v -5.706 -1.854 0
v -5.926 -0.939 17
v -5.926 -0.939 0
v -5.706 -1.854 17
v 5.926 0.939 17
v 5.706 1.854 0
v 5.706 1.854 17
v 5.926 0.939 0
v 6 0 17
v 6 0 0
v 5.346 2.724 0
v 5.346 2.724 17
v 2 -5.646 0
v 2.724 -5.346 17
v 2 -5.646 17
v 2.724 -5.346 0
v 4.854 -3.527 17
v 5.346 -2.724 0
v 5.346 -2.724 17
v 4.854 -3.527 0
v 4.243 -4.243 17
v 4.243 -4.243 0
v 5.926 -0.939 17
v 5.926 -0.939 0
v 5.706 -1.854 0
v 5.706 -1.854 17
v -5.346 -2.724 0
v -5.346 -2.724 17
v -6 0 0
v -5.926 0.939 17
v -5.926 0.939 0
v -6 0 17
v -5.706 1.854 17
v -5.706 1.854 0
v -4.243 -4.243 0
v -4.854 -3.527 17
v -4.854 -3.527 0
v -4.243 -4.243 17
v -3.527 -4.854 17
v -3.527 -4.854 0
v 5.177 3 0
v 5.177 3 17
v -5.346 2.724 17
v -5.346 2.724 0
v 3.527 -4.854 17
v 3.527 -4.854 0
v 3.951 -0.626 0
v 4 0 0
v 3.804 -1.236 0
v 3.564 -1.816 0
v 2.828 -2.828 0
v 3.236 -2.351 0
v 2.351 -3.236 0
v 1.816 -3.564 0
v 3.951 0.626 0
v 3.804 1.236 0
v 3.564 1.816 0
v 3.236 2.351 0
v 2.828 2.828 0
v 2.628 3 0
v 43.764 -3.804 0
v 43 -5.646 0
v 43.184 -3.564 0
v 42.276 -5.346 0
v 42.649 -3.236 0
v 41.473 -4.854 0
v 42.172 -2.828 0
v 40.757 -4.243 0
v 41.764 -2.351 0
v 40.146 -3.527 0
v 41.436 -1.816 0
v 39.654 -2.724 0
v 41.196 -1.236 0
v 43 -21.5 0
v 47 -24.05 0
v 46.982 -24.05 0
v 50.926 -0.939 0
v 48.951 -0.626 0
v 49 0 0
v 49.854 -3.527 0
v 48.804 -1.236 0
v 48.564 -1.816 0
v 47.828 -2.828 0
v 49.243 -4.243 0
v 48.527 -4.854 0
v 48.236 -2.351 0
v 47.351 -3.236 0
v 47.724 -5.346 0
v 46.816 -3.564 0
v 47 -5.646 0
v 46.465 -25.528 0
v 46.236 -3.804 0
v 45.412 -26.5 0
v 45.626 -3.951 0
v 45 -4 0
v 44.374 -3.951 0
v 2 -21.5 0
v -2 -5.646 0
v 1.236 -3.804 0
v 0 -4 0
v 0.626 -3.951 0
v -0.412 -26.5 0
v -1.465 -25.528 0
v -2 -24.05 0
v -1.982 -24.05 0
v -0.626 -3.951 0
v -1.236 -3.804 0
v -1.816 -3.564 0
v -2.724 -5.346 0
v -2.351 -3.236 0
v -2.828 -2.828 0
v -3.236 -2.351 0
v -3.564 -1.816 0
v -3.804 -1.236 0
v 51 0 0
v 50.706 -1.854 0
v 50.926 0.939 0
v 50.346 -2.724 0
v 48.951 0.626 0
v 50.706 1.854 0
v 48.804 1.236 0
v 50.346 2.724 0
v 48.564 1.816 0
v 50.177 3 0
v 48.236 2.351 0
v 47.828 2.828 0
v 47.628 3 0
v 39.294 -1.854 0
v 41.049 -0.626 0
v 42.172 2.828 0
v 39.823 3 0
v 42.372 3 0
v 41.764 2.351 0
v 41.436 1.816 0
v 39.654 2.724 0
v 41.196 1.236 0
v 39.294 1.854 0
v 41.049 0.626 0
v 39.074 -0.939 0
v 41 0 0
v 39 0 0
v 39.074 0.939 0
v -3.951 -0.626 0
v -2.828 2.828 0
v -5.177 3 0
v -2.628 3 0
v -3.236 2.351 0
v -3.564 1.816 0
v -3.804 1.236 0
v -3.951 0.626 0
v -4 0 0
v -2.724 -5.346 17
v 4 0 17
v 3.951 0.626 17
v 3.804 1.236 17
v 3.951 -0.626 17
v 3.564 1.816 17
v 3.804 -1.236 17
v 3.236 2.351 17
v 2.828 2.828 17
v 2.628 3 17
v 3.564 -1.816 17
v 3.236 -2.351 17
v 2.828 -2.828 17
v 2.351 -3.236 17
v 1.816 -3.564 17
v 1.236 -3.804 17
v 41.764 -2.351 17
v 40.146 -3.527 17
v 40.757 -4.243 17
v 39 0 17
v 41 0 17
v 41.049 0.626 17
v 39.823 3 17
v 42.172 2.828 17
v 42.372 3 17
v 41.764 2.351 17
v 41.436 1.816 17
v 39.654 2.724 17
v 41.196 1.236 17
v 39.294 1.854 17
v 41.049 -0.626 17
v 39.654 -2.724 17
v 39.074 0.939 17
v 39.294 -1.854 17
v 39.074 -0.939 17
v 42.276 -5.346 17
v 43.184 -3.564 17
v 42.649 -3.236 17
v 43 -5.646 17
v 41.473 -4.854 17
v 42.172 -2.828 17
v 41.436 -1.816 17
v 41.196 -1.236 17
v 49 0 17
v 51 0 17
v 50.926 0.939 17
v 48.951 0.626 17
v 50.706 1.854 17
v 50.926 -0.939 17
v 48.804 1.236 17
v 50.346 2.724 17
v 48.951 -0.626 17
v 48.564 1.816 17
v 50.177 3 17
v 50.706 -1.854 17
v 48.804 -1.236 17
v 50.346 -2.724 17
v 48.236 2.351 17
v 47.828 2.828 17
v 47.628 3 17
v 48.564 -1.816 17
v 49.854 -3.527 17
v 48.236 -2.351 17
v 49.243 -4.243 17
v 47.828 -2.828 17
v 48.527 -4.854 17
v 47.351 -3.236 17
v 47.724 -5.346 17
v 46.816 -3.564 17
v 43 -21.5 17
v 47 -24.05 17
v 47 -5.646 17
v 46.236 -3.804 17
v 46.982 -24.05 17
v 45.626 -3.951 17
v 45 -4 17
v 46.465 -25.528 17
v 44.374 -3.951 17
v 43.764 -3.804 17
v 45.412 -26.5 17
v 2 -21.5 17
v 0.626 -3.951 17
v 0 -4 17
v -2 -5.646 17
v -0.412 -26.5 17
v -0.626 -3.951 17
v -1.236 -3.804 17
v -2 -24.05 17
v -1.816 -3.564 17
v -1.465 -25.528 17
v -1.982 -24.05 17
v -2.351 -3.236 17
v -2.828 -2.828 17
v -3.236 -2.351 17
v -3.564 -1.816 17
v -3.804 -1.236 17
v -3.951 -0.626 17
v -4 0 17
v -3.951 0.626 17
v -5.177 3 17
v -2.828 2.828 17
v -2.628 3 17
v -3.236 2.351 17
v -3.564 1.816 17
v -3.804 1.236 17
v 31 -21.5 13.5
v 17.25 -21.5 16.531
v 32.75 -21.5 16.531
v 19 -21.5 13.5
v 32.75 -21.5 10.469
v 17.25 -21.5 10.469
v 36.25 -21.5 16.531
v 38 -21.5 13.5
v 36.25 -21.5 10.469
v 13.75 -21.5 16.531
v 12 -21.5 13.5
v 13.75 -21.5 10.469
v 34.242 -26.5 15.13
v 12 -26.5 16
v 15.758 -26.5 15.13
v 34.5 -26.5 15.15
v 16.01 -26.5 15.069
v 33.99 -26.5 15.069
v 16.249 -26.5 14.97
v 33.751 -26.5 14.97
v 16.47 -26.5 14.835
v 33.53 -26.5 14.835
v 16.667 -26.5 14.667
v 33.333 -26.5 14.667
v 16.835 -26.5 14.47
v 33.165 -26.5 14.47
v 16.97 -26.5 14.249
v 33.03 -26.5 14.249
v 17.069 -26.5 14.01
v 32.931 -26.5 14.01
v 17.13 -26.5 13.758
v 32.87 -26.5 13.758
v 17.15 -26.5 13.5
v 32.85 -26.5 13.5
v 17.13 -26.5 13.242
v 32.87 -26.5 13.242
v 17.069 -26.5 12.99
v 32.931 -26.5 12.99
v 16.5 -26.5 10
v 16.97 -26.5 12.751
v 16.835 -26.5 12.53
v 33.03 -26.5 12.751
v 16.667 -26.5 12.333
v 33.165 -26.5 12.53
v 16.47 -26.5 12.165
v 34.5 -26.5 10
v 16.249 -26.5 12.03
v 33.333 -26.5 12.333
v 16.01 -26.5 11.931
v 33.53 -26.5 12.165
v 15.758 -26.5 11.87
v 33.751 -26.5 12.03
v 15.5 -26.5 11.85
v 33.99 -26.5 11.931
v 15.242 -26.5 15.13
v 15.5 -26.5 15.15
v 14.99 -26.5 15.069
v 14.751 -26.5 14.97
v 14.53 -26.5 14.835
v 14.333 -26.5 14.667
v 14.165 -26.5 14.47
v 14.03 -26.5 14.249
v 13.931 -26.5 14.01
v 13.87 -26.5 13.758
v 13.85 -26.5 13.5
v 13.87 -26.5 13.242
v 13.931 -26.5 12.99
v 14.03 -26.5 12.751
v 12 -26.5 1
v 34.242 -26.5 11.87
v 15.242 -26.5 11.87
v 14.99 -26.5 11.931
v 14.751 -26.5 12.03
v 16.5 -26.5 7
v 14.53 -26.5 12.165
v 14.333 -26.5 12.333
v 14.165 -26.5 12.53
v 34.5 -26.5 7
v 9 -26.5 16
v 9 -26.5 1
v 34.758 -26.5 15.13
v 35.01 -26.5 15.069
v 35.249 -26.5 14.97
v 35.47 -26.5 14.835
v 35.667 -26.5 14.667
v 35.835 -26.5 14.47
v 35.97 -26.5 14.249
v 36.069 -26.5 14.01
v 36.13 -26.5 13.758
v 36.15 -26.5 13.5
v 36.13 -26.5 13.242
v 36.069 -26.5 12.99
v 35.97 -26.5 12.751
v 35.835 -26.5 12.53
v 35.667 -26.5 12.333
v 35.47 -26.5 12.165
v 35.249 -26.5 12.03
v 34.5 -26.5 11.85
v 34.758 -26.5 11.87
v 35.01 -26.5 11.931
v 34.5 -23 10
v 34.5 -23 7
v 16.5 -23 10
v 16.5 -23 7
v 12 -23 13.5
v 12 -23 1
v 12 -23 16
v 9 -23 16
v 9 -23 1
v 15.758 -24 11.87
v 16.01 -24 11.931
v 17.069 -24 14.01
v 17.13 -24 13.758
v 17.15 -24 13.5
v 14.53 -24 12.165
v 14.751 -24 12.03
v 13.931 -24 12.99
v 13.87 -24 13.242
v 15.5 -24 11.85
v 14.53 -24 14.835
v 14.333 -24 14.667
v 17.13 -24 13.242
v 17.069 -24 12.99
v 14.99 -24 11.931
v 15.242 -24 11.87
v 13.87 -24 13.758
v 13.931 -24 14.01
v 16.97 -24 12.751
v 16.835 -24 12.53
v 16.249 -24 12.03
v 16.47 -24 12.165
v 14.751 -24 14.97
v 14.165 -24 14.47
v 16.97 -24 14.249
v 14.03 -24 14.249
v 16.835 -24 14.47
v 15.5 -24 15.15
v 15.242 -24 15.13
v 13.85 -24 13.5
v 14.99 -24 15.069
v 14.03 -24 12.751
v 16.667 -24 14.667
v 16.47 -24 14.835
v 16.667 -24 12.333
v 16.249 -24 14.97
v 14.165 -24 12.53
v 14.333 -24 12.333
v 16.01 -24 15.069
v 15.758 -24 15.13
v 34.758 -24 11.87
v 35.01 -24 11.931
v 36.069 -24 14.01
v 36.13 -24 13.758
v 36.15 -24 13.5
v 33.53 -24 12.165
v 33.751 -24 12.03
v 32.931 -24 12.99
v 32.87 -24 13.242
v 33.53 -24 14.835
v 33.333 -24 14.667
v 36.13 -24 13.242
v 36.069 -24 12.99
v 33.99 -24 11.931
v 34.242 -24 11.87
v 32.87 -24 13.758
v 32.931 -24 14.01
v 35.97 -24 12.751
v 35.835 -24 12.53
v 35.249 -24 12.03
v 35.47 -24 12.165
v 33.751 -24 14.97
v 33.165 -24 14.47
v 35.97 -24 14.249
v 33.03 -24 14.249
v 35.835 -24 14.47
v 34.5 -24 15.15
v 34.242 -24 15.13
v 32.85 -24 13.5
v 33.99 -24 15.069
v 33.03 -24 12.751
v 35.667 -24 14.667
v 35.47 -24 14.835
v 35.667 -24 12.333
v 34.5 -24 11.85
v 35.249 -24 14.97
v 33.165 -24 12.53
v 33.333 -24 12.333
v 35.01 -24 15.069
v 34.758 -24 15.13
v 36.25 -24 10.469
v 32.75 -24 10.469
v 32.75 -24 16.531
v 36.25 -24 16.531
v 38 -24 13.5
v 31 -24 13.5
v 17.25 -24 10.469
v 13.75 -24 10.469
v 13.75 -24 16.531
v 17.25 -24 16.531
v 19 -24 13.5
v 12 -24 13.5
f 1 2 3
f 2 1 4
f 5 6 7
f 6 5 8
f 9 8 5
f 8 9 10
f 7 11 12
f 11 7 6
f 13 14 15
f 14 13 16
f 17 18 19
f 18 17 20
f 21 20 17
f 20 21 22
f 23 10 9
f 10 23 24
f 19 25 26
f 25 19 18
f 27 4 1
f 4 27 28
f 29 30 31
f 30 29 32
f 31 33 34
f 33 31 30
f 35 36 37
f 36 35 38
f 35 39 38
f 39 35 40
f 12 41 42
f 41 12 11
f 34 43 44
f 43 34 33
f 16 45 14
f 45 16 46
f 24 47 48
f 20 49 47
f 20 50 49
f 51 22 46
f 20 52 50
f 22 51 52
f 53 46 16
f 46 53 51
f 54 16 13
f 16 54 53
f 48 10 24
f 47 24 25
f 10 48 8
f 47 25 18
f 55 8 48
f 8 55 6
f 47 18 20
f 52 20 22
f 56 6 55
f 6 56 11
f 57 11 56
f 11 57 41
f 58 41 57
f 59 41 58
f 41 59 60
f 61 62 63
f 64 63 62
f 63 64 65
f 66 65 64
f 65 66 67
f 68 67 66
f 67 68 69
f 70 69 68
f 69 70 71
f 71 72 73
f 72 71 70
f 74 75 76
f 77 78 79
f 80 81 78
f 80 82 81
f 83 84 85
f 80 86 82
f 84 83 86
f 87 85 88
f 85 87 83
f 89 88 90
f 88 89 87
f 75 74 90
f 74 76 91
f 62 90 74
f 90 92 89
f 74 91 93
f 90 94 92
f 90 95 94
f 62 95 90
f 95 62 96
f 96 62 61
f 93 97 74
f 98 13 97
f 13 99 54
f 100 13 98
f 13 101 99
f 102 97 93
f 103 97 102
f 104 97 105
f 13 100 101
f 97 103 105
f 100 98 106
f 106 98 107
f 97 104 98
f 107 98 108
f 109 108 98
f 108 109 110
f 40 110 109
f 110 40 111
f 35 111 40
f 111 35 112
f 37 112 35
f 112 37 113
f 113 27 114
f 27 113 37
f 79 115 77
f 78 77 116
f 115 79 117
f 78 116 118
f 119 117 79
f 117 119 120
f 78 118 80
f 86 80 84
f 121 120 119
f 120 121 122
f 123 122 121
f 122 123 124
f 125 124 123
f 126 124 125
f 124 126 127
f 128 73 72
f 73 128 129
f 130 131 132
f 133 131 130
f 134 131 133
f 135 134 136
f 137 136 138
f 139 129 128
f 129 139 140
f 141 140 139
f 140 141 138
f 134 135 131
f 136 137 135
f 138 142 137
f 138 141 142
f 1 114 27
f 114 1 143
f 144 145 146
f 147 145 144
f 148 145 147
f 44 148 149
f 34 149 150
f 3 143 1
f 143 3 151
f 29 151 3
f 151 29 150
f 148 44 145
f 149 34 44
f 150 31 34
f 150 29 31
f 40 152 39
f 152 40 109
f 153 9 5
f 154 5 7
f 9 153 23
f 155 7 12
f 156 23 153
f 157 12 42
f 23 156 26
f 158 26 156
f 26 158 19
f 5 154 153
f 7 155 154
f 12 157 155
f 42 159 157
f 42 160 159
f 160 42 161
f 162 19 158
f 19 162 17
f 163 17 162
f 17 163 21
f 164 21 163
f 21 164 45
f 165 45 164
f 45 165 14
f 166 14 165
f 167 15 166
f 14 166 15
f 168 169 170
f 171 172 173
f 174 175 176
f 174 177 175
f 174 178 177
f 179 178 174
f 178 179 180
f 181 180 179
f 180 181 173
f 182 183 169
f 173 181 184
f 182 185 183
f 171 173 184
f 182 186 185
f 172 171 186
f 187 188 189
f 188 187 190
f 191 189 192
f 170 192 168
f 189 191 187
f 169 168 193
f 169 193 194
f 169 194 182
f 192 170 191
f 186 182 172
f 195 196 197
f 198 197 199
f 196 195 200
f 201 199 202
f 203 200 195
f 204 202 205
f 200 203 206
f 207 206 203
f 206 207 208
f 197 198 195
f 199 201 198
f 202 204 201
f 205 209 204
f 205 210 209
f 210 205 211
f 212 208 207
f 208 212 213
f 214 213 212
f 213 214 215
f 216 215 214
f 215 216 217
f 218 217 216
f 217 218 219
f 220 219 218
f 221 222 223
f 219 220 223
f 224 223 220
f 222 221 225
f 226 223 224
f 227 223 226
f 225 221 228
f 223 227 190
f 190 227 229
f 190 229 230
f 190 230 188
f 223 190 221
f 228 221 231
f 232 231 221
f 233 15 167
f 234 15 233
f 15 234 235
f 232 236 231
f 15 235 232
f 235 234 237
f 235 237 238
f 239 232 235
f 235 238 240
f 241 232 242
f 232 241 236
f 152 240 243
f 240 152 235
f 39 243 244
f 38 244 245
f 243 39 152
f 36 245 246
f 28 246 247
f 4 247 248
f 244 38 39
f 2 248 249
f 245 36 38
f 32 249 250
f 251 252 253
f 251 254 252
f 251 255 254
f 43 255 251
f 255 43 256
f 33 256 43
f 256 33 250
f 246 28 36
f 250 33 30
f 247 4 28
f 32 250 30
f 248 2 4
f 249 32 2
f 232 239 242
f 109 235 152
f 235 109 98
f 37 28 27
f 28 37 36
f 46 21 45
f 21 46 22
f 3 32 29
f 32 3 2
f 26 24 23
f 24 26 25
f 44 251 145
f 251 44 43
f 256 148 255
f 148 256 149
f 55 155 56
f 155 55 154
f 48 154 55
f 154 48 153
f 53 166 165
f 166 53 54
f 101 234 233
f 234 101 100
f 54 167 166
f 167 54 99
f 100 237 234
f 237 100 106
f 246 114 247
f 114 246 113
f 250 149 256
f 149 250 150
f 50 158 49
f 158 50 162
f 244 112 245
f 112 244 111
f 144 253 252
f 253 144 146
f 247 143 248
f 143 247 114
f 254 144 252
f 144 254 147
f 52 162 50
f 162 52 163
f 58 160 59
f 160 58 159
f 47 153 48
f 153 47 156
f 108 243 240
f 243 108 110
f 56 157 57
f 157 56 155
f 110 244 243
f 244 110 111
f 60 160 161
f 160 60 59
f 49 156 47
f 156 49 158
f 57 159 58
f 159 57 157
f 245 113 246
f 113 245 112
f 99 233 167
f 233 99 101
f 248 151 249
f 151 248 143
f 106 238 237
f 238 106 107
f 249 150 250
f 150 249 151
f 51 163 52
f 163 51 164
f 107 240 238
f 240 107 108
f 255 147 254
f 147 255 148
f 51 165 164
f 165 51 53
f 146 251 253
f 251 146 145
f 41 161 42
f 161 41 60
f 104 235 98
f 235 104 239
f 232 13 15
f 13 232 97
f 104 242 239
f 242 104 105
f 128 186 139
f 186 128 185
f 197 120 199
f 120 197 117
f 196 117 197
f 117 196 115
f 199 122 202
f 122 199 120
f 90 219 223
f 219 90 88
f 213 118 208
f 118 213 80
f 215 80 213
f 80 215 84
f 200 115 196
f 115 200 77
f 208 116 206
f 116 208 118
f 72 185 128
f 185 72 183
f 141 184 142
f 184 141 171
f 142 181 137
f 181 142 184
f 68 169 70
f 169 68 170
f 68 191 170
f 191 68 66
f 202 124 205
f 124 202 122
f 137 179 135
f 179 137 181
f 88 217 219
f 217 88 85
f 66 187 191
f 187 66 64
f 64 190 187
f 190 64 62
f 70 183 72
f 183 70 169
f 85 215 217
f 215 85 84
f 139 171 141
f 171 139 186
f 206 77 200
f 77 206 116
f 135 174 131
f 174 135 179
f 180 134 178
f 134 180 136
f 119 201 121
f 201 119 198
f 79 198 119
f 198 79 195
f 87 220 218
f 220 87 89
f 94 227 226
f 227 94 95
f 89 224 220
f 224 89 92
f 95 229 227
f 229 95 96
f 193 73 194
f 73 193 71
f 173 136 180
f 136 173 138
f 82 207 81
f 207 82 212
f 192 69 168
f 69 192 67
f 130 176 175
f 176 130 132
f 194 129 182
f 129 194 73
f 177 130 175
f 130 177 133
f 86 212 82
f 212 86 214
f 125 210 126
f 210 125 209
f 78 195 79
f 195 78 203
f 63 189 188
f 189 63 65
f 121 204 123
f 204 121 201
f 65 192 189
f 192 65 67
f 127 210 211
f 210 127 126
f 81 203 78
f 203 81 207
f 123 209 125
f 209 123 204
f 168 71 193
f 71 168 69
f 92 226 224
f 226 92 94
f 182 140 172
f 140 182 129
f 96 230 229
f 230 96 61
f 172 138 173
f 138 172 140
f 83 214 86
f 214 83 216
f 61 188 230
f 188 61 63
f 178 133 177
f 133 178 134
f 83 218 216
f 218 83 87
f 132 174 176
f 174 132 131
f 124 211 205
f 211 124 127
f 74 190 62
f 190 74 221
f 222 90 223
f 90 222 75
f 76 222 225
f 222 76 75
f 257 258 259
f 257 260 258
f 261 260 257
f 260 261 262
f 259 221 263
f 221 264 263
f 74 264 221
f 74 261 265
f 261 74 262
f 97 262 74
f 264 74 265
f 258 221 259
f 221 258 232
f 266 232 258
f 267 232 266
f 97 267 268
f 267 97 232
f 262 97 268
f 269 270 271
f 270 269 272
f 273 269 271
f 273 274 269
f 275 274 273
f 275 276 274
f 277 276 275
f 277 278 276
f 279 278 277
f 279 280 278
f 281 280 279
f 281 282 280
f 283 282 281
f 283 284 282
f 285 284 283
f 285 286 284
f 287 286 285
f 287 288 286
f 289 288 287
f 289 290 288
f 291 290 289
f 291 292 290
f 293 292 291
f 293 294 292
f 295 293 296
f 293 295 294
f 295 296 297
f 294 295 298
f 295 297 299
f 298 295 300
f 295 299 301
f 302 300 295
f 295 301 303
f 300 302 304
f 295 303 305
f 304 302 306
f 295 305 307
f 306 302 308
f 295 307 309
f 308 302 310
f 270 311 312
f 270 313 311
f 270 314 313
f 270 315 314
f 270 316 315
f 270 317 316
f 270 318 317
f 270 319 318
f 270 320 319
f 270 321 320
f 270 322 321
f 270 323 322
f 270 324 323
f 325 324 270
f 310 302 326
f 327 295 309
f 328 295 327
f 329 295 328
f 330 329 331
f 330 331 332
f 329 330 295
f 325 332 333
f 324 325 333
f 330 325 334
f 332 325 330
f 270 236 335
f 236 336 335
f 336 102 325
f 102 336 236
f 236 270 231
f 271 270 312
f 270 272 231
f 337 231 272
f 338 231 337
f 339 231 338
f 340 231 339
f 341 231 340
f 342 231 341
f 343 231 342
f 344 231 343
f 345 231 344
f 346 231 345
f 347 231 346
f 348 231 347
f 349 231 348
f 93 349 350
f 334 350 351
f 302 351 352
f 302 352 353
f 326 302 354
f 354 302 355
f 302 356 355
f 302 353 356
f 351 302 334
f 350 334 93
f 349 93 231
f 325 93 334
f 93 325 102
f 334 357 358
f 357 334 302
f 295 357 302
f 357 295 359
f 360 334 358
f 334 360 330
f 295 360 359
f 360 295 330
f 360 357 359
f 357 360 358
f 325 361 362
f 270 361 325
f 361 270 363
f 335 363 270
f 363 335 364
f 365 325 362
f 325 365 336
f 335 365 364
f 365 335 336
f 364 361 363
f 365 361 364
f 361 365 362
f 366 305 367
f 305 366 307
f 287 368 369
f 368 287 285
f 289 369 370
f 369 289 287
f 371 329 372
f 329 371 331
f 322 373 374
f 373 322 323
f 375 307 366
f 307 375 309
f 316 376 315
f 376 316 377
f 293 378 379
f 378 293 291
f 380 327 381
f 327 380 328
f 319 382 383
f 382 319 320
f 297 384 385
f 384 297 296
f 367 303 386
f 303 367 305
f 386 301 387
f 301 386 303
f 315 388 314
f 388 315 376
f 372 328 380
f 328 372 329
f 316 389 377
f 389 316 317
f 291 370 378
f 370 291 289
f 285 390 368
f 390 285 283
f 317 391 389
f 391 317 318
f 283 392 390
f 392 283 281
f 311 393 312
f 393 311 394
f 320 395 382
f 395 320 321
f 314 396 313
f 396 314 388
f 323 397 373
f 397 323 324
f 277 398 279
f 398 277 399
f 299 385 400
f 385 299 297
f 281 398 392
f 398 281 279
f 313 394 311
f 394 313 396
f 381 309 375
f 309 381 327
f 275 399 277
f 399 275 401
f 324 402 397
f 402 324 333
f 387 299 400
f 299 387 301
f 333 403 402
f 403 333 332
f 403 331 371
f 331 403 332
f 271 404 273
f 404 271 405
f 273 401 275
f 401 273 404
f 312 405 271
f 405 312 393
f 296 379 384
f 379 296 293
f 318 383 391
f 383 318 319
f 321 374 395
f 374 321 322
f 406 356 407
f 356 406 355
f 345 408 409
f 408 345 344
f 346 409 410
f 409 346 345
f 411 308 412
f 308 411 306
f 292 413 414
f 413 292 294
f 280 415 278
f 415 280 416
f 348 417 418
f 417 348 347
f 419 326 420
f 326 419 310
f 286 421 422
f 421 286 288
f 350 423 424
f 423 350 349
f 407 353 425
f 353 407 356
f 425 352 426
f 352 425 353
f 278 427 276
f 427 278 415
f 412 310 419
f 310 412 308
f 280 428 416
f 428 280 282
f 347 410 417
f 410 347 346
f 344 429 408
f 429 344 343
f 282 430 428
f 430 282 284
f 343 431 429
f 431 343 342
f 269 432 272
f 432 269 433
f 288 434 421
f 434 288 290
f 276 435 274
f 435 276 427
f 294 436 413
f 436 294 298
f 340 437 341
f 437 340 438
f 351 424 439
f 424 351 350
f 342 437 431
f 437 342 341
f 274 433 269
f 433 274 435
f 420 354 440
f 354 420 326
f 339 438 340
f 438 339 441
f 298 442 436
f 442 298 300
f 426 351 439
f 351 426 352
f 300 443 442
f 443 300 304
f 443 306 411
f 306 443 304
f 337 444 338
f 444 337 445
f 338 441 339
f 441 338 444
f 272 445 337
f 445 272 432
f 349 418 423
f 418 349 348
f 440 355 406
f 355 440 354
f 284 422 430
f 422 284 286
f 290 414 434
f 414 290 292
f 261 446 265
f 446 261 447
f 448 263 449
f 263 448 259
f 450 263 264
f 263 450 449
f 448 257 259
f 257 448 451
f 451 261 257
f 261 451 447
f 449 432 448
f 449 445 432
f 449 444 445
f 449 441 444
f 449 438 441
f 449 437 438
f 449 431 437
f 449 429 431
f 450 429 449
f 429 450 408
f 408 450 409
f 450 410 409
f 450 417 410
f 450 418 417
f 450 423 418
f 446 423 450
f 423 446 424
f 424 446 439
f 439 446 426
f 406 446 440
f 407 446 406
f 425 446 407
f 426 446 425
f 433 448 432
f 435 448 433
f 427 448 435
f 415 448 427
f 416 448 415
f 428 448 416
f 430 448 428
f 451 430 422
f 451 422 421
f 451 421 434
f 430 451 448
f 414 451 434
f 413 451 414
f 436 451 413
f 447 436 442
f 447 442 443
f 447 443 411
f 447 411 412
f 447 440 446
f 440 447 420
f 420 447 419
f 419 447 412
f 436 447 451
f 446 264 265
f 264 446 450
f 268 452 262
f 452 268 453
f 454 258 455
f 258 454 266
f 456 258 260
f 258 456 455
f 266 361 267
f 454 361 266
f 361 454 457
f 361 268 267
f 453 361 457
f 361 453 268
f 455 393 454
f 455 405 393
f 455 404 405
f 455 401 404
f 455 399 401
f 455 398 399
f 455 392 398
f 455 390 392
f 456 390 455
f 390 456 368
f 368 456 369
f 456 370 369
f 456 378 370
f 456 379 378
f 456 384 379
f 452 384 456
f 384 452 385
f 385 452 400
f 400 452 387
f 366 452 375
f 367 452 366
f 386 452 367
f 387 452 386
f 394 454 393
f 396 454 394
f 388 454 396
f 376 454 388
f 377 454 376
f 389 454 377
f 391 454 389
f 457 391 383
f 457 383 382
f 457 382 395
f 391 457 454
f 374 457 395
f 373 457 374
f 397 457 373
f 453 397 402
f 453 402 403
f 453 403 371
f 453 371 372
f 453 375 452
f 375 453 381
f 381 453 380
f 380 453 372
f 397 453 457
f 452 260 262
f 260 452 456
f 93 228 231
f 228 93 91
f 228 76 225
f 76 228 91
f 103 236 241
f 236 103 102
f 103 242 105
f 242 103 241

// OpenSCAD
// created by Christopher Behrmann [3d@cbxy.de] 16.03.2019


//Customizable X-Endstop for prusa i3 alike printers

//What is your rod diameter?
rod_diameter = 8; //[2:12]
//What is the z-distance of your rods?
rod_distance = 45; //[35:55]
//how much inwards do you need the endstop?
depth = 20 ; //[10:30]

//how thick do you need your walls?
thickness = 2; // [1:5]

//which height do you want?
height = 17;  // [15:20]







module tube(inner,wall,height, stick=2){
    union(){
    difference(){
            cylinder(d=inner+2*wall,h=height,$fn=40);
            translate([0,0,-1]) cylinder(d=inner, h=height+2, $fn=40);
            translate([-inner-wall,3,-1]) cube([2*inner+2*wall, inner+wall,height+2]);
    }
    rotate([180,180,0]) translate([-wall,inner/2+0.05,0]) cube([2*wall,stick,height]);//,center=true);
}
}

module connector(length, thickness, height){
    translate([0,0,height/2]) 
    intersection(){
    difference(){
        translate([0,0,0]) cube([length, thickness, height], center=true);
        translate([3,-1,0]) cube([18,4,3],center=true);
        translate([-12,-1]) cube([3,4,height-2], center=true);
        rotate([90,0,0]) translate([-7,5,-thickness+1]) cylinder(d=3.3,h=thickness+2,$fn=40);
        rotate([90,0,0]) translate([12,5,-thickness+1]) cylinder(d=3.3,h=thickness+2,$fn=40);
        rotate([90,0,0]) translate([12,5,-thickness-3]) cylinder(d=7.0,h=thickness+3, $fn=6);
        rotate([90,0,0]) translate([-7,5,-thickness-3]) cylinder(d=7.0,h=thickness+3,$fn=6);    
    }
    scale([1,0.3,1]) cylinder(d=length-2,h=30, center=true);
}
}

    
//start construct here


//!connector(52,5,17)



union(){
    tube(rod_diameter,thickness,height,depth);
    translate([rod_distance,0,0]) tube(rod_diameter,thickness,height,depth);   
    translate([rod_distance/2,-depth-4,0]) connector(rod_distance+2*thickness+2,5,height) ;
}
